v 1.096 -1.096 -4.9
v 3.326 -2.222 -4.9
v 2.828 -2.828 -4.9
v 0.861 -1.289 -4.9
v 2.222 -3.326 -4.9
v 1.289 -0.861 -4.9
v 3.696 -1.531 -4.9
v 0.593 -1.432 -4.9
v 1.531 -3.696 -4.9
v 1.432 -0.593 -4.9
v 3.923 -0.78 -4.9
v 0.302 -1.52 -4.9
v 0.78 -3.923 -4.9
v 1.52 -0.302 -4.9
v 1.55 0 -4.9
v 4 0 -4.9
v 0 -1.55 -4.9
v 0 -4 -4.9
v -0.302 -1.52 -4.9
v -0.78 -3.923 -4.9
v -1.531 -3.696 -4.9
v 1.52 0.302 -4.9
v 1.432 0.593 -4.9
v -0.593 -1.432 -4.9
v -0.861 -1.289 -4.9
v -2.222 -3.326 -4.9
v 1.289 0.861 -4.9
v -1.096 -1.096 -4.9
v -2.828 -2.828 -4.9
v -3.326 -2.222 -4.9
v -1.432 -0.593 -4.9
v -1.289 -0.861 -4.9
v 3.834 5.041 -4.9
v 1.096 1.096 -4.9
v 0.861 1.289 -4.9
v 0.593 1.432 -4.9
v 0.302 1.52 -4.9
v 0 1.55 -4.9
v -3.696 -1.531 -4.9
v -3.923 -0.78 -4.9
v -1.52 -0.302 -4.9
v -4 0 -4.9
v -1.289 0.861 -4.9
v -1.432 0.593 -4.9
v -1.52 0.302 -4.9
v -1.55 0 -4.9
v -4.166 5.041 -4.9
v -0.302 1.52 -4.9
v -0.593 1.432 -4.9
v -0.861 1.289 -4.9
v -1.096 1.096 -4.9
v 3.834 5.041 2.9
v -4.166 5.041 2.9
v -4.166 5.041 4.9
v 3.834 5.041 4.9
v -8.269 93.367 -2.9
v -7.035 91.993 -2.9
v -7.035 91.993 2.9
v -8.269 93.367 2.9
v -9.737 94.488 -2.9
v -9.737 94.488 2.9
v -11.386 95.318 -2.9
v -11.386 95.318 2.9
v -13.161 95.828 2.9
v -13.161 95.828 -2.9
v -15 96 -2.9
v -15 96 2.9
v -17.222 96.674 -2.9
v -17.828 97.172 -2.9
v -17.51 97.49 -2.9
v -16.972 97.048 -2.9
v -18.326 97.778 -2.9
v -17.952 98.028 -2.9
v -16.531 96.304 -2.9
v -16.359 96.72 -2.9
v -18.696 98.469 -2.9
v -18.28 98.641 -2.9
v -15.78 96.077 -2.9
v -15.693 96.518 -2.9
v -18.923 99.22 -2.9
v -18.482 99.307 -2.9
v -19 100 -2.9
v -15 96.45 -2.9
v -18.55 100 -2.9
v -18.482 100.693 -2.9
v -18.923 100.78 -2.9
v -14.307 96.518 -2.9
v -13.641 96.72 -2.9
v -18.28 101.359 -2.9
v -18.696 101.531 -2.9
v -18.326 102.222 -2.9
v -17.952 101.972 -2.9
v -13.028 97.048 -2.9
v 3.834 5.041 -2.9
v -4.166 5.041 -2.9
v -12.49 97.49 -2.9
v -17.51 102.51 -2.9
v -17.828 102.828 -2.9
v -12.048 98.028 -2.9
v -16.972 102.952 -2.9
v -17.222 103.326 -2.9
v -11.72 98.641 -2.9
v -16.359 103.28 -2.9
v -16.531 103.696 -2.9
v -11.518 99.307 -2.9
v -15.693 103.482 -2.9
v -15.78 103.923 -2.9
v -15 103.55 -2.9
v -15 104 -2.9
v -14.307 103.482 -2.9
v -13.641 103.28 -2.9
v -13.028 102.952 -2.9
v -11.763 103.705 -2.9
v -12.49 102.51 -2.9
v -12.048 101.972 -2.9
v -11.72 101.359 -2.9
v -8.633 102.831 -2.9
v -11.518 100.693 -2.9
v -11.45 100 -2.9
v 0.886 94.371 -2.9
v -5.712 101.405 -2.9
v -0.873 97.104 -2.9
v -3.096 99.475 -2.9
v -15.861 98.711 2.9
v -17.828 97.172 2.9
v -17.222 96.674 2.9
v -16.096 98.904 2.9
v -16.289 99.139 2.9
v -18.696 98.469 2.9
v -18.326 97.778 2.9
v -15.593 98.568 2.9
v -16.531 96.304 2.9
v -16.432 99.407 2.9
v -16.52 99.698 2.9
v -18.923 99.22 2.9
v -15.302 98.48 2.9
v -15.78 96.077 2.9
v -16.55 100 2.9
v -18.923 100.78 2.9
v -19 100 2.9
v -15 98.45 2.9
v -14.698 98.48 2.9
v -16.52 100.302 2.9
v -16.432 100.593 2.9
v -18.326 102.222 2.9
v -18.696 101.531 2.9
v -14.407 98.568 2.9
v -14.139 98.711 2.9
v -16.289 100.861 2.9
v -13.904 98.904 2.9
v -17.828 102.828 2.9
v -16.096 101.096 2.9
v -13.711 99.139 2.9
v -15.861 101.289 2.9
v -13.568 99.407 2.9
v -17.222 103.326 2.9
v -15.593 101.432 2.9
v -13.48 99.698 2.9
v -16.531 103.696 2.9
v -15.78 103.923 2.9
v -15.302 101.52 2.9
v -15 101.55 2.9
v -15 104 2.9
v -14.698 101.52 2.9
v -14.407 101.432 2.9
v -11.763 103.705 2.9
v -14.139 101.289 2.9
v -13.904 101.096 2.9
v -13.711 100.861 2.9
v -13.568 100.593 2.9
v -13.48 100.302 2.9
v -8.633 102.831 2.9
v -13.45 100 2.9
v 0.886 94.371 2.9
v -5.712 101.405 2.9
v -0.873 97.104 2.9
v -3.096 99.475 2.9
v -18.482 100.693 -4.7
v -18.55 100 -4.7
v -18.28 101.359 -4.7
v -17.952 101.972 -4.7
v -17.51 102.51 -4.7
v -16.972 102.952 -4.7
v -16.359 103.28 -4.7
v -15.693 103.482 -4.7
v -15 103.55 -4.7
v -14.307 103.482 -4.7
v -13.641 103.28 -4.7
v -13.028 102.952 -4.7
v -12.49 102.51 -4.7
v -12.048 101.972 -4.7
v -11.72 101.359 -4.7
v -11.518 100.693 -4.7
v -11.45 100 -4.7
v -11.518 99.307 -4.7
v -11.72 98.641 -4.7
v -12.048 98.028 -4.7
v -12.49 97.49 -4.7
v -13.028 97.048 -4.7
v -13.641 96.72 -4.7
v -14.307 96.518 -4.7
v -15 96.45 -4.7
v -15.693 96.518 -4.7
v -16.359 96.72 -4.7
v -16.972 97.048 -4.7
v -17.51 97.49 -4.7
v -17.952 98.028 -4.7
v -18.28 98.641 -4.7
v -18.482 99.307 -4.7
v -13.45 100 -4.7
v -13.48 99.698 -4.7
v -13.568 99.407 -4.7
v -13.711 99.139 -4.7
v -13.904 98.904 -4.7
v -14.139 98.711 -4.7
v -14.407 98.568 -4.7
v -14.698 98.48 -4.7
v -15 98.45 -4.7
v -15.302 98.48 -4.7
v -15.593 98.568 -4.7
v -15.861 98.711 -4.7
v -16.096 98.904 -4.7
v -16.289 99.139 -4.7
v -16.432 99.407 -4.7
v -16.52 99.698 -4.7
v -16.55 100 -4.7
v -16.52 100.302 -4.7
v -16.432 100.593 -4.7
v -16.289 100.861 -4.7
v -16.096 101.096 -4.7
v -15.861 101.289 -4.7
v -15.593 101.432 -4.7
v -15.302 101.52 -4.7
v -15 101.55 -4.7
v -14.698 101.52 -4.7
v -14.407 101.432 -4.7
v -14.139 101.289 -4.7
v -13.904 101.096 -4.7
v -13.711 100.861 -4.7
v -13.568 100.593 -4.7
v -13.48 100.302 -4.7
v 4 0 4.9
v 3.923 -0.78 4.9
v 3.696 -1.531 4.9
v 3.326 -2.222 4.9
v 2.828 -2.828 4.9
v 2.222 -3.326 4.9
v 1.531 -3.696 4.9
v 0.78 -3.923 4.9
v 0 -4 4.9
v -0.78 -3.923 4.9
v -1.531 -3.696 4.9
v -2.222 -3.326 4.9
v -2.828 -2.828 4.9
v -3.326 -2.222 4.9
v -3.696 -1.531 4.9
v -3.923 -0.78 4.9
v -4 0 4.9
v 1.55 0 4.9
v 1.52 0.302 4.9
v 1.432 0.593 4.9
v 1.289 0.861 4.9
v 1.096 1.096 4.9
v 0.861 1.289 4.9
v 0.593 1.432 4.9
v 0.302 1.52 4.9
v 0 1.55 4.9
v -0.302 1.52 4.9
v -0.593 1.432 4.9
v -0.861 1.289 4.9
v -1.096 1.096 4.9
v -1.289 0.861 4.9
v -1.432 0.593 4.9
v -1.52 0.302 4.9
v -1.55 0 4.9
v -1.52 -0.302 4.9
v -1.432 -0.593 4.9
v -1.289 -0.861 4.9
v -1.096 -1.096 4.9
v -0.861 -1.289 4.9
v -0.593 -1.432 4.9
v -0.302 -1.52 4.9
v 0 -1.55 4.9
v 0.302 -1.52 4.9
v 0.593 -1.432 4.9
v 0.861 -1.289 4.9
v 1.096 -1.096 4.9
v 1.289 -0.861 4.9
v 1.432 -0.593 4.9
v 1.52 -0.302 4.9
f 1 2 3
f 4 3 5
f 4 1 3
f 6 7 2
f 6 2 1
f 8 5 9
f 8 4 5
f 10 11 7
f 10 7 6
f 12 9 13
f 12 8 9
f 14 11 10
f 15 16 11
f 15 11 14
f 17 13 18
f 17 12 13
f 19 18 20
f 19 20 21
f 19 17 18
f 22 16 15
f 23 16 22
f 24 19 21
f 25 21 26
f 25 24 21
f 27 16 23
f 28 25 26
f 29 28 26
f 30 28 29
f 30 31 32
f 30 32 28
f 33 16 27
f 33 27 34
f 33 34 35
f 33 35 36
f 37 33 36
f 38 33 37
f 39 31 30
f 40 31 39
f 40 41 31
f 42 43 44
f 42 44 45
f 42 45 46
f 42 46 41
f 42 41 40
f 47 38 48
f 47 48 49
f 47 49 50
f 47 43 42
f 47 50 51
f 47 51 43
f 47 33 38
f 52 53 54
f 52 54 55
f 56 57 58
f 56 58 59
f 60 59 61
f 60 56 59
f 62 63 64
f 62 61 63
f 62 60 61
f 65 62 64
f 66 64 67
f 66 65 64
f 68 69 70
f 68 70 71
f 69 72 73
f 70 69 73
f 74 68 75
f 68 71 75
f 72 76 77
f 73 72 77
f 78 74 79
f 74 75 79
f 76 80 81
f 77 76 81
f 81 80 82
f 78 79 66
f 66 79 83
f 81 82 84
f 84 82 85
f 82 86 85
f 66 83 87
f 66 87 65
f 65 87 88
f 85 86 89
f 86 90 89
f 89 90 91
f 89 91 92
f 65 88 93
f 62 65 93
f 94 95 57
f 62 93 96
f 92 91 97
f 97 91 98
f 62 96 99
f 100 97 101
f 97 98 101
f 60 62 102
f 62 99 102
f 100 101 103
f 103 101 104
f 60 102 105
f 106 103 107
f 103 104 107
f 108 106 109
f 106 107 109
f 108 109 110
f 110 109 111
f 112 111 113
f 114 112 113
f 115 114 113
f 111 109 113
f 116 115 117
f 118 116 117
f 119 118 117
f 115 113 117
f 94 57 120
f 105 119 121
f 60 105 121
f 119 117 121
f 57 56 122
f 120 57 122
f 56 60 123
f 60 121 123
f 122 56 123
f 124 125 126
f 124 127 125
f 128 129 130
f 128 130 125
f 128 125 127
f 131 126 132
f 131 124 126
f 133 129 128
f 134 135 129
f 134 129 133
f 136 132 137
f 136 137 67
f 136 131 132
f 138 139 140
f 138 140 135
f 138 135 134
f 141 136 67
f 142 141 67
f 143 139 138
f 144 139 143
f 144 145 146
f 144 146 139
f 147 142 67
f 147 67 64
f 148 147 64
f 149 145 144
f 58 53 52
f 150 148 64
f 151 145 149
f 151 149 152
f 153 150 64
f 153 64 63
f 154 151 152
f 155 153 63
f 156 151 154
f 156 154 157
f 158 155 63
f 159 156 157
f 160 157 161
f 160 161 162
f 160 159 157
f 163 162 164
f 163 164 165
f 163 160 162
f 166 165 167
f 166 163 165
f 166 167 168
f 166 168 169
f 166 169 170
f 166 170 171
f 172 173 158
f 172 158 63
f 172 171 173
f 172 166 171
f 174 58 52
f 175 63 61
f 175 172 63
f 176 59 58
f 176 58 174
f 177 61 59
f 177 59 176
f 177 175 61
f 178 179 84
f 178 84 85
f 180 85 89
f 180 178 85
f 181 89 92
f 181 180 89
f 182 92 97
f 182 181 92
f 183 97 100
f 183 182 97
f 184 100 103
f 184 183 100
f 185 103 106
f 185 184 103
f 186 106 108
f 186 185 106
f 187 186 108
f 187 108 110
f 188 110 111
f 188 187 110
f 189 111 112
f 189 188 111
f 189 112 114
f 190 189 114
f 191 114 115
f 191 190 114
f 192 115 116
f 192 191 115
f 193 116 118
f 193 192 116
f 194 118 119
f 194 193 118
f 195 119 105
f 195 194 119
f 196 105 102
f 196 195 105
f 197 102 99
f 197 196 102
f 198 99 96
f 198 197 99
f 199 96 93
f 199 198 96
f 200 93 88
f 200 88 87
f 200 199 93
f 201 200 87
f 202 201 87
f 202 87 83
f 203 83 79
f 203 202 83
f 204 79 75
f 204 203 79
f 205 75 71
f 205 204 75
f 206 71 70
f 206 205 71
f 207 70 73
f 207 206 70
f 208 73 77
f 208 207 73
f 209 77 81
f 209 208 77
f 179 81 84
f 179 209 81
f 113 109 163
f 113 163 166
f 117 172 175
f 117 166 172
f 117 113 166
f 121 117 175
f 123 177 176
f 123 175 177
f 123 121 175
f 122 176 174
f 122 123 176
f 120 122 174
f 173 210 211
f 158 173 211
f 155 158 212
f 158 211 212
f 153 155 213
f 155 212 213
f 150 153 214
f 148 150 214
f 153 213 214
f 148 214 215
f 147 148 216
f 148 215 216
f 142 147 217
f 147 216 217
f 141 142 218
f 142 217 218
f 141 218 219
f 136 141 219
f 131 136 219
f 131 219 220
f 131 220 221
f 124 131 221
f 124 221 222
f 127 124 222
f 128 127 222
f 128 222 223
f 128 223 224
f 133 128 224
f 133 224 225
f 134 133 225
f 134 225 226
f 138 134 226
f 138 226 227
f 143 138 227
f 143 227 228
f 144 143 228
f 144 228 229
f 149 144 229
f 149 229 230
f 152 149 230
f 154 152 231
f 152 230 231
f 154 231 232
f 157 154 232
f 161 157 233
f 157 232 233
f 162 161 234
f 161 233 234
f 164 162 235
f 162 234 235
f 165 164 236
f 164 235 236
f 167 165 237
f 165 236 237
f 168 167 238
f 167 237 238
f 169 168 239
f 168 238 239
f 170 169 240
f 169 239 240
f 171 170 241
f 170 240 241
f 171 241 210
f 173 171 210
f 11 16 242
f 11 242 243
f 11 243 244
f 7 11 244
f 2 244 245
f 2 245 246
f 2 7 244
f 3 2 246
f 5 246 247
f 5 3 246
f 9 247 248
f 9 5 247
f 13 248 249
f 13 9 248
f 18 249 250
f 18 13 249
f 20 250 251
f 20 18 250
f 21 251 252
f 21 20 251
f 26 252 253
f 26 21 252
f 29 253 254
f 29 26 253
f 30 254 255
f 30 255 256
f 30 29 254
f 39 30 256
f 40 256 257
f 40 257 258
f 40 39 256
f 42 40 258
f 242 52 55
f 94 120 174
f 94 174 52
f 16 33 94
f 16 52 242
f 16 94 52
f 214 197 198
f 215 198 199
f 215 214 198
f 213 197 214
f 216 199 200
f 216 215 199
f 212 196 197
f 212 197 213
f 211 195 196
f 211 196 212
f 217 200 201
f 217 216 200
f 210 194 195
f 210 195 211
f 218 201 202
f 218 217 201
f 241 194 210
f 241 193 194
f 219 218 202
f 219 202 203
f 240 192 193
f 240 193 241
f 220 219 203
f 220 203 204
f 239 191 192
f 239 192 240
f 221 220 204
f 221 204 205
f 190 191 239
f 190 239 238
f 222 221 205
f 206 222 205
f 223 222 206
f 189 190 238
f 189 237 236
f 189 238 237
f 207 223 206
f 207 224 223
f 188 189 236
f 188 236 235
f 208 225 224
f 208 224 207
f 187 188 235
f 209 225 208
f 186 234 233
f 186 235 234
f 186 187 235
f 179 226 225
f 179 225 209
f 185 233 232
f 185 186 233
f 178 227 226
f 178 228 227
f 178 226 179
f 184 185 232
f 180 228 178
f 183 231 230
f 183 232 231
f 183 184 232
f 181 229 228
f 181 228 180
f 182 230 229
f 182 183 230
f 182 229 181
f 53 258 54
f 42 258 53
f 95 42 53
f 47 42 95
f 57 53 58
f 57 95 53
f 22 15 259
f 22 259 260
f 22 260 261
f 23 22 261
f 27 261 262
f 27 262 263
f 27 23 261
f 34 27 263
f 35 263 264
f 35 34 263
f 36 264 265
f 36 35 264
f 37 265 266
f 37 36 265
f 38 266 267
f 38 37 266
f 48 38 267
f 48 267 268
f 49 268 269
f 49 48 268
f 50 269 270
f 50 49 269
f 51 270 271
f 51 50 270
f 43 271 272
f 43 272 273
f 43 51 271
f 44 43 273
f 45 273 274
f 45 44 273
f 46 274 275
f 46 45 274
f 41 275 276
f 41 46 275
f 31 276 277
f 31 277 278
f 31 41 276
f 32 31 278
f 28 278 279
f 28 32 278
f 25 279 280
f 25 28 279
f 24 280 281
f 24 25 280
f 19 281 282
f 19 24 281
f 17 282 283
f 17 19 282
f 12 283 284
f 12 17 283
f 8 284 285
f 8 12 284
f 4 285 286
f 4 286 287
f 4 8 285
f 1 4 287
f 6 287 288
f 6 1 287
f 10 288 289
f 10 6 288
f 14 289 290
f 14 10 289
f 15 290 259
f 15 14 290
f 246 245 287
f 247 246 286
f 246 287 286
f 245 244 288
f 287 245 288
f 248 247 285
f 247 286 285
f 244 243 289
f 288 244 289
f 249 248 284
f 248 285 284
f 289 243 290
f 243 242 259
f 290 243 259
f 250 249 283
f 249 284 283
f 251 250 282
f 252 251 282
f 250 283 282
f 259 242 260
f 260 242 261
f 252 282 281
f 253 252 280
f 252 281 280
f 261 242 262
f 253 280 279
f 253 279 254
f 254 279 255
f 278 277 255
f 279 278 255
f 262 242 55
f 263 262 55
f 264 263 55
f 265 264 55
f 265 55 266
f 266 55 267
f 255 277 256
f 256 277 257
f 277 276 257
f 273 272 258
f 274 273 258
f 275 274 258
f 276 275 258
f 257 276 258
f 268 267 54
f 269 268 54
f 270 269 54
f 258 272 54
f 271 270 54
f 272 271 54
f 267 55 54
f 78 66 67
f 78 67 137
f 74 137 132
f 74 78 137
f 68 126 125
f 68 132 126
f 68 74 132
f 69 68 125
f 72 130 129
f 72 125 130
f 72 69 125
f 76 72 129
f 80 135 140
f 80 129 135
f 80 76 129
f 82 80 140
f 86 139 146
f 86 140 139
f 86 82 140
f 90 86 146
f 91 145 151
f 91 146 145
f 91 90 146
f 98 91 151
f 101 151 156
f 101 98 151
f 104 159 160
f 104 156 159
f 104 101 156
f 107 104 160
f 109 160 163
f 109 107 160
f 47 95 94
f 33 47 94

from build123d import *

# Parameters (mm, degrees)
BOSS_EXTRU_1_DEPTH      = 4.9
BOSS_EXTRU_1_DEPTH_BACK = 4.9
ESQUISSE1_R             = 1.55
CUT_EXTRUDE1_START      = -2
CUT_EXTRUDE1_DEPTH      = 2
BOSS_EXTRUDE1_START     = 1.8
SKETCH2_R               = 3.55
SKETCH2_R_2             = 1.55
BOSS_EXTRUDE1_DEPTH     = 1.8


with BuildPart() as part:
    # Esquisse1 → Boss.-Extru.1 (new, two sides: drawn at the far end of the back side and taken through both)
    with BuildSketch(Plane.XY.offset(-BOSS_EXTRU_1_DEPTH_BACK)):
        with BuildLine():
            Line((-7.035134666, 91.99317437), (-4, 0))
            ThreePointArc((-4, 0), (0, -4), (4, 0))
            Line((4, 0), (0.886406153, 94.37122672))
            ThreePointArc((0.886406153, 94.37122672), (-5.711685092, 101.40489844), (-15, 104))
            ThreePointArc((-15, 104), (-19, 100), (-15, 96))
            ThreePointArc((-15, 96), (-10.542037141, 94.941857654), (-7.035134666, 91.99317437))
        make_face()
        Circle(ESQUISSE1_R, mode=Mode.SUBTRACT)
        with Locations((-15, 100)):
            Circle(ESQUISSE1_R, mode=Mode.SUBTRACT)
    extrude(amount=BOSS_EXTRU_1_DEPTH + BOSS_EXTRU_1_DEPTH_BACK)

    # Sketch1 → Cut-Extrude1 (cut)
    with BuildSketch(Plane.XY.offset(4.9).offset(CUT_EXTRUDE1_START)):
        with BuildLine():
            Line((-7.035134666, 91.99317437), (-4.166311888, 5.040817029))
            Line((-4.166311888, 5.040817029), (3.833688112, 5.040817029))
            Line((3.833688112, 5.040817029), (0.886406153, 94.37122672))
            ThreePointArc((0.886406153, 94.37122672), (-5.711685092, 101.40489844), (-15, 104))
            ThreePointArc((-15, 104), (-19, 100), (-15, 96))
            ThreePointArc((-15, 96), (-10.542037141, 94.941857654), (-7.035134666, 91.99317437))
        make_face()
    cut_extrude1 = extrude(amount=CUT_EXTRUDE1_DEPTH, mode=Mode.SUBTRACT)

    # Mirror1: Cut-Extrude1 across plane
    add(cut_extrude1.mirror(Plane.XY), mode=Mode.SUBTRACT)

    # Sketch2 → Boss-Extrude1 (add)
    with BuildSketch(Plane(origin=(0, 0, -2.9), x_dir=(-1, 0, 0), z_dir=(0, 0, -1)).offset(BOSS_EXTRUDE1_START)):
        with Locations((15, 100)):
            Circle(SKETCH2_R)
        with Locations((15, 100)):
            Circle(SKETCH2_R_2, mode=Mode.SUBTRACT)
    extrude(amount=-BOSS_EXTRUDE1_DEPTH)


solid = part.part
